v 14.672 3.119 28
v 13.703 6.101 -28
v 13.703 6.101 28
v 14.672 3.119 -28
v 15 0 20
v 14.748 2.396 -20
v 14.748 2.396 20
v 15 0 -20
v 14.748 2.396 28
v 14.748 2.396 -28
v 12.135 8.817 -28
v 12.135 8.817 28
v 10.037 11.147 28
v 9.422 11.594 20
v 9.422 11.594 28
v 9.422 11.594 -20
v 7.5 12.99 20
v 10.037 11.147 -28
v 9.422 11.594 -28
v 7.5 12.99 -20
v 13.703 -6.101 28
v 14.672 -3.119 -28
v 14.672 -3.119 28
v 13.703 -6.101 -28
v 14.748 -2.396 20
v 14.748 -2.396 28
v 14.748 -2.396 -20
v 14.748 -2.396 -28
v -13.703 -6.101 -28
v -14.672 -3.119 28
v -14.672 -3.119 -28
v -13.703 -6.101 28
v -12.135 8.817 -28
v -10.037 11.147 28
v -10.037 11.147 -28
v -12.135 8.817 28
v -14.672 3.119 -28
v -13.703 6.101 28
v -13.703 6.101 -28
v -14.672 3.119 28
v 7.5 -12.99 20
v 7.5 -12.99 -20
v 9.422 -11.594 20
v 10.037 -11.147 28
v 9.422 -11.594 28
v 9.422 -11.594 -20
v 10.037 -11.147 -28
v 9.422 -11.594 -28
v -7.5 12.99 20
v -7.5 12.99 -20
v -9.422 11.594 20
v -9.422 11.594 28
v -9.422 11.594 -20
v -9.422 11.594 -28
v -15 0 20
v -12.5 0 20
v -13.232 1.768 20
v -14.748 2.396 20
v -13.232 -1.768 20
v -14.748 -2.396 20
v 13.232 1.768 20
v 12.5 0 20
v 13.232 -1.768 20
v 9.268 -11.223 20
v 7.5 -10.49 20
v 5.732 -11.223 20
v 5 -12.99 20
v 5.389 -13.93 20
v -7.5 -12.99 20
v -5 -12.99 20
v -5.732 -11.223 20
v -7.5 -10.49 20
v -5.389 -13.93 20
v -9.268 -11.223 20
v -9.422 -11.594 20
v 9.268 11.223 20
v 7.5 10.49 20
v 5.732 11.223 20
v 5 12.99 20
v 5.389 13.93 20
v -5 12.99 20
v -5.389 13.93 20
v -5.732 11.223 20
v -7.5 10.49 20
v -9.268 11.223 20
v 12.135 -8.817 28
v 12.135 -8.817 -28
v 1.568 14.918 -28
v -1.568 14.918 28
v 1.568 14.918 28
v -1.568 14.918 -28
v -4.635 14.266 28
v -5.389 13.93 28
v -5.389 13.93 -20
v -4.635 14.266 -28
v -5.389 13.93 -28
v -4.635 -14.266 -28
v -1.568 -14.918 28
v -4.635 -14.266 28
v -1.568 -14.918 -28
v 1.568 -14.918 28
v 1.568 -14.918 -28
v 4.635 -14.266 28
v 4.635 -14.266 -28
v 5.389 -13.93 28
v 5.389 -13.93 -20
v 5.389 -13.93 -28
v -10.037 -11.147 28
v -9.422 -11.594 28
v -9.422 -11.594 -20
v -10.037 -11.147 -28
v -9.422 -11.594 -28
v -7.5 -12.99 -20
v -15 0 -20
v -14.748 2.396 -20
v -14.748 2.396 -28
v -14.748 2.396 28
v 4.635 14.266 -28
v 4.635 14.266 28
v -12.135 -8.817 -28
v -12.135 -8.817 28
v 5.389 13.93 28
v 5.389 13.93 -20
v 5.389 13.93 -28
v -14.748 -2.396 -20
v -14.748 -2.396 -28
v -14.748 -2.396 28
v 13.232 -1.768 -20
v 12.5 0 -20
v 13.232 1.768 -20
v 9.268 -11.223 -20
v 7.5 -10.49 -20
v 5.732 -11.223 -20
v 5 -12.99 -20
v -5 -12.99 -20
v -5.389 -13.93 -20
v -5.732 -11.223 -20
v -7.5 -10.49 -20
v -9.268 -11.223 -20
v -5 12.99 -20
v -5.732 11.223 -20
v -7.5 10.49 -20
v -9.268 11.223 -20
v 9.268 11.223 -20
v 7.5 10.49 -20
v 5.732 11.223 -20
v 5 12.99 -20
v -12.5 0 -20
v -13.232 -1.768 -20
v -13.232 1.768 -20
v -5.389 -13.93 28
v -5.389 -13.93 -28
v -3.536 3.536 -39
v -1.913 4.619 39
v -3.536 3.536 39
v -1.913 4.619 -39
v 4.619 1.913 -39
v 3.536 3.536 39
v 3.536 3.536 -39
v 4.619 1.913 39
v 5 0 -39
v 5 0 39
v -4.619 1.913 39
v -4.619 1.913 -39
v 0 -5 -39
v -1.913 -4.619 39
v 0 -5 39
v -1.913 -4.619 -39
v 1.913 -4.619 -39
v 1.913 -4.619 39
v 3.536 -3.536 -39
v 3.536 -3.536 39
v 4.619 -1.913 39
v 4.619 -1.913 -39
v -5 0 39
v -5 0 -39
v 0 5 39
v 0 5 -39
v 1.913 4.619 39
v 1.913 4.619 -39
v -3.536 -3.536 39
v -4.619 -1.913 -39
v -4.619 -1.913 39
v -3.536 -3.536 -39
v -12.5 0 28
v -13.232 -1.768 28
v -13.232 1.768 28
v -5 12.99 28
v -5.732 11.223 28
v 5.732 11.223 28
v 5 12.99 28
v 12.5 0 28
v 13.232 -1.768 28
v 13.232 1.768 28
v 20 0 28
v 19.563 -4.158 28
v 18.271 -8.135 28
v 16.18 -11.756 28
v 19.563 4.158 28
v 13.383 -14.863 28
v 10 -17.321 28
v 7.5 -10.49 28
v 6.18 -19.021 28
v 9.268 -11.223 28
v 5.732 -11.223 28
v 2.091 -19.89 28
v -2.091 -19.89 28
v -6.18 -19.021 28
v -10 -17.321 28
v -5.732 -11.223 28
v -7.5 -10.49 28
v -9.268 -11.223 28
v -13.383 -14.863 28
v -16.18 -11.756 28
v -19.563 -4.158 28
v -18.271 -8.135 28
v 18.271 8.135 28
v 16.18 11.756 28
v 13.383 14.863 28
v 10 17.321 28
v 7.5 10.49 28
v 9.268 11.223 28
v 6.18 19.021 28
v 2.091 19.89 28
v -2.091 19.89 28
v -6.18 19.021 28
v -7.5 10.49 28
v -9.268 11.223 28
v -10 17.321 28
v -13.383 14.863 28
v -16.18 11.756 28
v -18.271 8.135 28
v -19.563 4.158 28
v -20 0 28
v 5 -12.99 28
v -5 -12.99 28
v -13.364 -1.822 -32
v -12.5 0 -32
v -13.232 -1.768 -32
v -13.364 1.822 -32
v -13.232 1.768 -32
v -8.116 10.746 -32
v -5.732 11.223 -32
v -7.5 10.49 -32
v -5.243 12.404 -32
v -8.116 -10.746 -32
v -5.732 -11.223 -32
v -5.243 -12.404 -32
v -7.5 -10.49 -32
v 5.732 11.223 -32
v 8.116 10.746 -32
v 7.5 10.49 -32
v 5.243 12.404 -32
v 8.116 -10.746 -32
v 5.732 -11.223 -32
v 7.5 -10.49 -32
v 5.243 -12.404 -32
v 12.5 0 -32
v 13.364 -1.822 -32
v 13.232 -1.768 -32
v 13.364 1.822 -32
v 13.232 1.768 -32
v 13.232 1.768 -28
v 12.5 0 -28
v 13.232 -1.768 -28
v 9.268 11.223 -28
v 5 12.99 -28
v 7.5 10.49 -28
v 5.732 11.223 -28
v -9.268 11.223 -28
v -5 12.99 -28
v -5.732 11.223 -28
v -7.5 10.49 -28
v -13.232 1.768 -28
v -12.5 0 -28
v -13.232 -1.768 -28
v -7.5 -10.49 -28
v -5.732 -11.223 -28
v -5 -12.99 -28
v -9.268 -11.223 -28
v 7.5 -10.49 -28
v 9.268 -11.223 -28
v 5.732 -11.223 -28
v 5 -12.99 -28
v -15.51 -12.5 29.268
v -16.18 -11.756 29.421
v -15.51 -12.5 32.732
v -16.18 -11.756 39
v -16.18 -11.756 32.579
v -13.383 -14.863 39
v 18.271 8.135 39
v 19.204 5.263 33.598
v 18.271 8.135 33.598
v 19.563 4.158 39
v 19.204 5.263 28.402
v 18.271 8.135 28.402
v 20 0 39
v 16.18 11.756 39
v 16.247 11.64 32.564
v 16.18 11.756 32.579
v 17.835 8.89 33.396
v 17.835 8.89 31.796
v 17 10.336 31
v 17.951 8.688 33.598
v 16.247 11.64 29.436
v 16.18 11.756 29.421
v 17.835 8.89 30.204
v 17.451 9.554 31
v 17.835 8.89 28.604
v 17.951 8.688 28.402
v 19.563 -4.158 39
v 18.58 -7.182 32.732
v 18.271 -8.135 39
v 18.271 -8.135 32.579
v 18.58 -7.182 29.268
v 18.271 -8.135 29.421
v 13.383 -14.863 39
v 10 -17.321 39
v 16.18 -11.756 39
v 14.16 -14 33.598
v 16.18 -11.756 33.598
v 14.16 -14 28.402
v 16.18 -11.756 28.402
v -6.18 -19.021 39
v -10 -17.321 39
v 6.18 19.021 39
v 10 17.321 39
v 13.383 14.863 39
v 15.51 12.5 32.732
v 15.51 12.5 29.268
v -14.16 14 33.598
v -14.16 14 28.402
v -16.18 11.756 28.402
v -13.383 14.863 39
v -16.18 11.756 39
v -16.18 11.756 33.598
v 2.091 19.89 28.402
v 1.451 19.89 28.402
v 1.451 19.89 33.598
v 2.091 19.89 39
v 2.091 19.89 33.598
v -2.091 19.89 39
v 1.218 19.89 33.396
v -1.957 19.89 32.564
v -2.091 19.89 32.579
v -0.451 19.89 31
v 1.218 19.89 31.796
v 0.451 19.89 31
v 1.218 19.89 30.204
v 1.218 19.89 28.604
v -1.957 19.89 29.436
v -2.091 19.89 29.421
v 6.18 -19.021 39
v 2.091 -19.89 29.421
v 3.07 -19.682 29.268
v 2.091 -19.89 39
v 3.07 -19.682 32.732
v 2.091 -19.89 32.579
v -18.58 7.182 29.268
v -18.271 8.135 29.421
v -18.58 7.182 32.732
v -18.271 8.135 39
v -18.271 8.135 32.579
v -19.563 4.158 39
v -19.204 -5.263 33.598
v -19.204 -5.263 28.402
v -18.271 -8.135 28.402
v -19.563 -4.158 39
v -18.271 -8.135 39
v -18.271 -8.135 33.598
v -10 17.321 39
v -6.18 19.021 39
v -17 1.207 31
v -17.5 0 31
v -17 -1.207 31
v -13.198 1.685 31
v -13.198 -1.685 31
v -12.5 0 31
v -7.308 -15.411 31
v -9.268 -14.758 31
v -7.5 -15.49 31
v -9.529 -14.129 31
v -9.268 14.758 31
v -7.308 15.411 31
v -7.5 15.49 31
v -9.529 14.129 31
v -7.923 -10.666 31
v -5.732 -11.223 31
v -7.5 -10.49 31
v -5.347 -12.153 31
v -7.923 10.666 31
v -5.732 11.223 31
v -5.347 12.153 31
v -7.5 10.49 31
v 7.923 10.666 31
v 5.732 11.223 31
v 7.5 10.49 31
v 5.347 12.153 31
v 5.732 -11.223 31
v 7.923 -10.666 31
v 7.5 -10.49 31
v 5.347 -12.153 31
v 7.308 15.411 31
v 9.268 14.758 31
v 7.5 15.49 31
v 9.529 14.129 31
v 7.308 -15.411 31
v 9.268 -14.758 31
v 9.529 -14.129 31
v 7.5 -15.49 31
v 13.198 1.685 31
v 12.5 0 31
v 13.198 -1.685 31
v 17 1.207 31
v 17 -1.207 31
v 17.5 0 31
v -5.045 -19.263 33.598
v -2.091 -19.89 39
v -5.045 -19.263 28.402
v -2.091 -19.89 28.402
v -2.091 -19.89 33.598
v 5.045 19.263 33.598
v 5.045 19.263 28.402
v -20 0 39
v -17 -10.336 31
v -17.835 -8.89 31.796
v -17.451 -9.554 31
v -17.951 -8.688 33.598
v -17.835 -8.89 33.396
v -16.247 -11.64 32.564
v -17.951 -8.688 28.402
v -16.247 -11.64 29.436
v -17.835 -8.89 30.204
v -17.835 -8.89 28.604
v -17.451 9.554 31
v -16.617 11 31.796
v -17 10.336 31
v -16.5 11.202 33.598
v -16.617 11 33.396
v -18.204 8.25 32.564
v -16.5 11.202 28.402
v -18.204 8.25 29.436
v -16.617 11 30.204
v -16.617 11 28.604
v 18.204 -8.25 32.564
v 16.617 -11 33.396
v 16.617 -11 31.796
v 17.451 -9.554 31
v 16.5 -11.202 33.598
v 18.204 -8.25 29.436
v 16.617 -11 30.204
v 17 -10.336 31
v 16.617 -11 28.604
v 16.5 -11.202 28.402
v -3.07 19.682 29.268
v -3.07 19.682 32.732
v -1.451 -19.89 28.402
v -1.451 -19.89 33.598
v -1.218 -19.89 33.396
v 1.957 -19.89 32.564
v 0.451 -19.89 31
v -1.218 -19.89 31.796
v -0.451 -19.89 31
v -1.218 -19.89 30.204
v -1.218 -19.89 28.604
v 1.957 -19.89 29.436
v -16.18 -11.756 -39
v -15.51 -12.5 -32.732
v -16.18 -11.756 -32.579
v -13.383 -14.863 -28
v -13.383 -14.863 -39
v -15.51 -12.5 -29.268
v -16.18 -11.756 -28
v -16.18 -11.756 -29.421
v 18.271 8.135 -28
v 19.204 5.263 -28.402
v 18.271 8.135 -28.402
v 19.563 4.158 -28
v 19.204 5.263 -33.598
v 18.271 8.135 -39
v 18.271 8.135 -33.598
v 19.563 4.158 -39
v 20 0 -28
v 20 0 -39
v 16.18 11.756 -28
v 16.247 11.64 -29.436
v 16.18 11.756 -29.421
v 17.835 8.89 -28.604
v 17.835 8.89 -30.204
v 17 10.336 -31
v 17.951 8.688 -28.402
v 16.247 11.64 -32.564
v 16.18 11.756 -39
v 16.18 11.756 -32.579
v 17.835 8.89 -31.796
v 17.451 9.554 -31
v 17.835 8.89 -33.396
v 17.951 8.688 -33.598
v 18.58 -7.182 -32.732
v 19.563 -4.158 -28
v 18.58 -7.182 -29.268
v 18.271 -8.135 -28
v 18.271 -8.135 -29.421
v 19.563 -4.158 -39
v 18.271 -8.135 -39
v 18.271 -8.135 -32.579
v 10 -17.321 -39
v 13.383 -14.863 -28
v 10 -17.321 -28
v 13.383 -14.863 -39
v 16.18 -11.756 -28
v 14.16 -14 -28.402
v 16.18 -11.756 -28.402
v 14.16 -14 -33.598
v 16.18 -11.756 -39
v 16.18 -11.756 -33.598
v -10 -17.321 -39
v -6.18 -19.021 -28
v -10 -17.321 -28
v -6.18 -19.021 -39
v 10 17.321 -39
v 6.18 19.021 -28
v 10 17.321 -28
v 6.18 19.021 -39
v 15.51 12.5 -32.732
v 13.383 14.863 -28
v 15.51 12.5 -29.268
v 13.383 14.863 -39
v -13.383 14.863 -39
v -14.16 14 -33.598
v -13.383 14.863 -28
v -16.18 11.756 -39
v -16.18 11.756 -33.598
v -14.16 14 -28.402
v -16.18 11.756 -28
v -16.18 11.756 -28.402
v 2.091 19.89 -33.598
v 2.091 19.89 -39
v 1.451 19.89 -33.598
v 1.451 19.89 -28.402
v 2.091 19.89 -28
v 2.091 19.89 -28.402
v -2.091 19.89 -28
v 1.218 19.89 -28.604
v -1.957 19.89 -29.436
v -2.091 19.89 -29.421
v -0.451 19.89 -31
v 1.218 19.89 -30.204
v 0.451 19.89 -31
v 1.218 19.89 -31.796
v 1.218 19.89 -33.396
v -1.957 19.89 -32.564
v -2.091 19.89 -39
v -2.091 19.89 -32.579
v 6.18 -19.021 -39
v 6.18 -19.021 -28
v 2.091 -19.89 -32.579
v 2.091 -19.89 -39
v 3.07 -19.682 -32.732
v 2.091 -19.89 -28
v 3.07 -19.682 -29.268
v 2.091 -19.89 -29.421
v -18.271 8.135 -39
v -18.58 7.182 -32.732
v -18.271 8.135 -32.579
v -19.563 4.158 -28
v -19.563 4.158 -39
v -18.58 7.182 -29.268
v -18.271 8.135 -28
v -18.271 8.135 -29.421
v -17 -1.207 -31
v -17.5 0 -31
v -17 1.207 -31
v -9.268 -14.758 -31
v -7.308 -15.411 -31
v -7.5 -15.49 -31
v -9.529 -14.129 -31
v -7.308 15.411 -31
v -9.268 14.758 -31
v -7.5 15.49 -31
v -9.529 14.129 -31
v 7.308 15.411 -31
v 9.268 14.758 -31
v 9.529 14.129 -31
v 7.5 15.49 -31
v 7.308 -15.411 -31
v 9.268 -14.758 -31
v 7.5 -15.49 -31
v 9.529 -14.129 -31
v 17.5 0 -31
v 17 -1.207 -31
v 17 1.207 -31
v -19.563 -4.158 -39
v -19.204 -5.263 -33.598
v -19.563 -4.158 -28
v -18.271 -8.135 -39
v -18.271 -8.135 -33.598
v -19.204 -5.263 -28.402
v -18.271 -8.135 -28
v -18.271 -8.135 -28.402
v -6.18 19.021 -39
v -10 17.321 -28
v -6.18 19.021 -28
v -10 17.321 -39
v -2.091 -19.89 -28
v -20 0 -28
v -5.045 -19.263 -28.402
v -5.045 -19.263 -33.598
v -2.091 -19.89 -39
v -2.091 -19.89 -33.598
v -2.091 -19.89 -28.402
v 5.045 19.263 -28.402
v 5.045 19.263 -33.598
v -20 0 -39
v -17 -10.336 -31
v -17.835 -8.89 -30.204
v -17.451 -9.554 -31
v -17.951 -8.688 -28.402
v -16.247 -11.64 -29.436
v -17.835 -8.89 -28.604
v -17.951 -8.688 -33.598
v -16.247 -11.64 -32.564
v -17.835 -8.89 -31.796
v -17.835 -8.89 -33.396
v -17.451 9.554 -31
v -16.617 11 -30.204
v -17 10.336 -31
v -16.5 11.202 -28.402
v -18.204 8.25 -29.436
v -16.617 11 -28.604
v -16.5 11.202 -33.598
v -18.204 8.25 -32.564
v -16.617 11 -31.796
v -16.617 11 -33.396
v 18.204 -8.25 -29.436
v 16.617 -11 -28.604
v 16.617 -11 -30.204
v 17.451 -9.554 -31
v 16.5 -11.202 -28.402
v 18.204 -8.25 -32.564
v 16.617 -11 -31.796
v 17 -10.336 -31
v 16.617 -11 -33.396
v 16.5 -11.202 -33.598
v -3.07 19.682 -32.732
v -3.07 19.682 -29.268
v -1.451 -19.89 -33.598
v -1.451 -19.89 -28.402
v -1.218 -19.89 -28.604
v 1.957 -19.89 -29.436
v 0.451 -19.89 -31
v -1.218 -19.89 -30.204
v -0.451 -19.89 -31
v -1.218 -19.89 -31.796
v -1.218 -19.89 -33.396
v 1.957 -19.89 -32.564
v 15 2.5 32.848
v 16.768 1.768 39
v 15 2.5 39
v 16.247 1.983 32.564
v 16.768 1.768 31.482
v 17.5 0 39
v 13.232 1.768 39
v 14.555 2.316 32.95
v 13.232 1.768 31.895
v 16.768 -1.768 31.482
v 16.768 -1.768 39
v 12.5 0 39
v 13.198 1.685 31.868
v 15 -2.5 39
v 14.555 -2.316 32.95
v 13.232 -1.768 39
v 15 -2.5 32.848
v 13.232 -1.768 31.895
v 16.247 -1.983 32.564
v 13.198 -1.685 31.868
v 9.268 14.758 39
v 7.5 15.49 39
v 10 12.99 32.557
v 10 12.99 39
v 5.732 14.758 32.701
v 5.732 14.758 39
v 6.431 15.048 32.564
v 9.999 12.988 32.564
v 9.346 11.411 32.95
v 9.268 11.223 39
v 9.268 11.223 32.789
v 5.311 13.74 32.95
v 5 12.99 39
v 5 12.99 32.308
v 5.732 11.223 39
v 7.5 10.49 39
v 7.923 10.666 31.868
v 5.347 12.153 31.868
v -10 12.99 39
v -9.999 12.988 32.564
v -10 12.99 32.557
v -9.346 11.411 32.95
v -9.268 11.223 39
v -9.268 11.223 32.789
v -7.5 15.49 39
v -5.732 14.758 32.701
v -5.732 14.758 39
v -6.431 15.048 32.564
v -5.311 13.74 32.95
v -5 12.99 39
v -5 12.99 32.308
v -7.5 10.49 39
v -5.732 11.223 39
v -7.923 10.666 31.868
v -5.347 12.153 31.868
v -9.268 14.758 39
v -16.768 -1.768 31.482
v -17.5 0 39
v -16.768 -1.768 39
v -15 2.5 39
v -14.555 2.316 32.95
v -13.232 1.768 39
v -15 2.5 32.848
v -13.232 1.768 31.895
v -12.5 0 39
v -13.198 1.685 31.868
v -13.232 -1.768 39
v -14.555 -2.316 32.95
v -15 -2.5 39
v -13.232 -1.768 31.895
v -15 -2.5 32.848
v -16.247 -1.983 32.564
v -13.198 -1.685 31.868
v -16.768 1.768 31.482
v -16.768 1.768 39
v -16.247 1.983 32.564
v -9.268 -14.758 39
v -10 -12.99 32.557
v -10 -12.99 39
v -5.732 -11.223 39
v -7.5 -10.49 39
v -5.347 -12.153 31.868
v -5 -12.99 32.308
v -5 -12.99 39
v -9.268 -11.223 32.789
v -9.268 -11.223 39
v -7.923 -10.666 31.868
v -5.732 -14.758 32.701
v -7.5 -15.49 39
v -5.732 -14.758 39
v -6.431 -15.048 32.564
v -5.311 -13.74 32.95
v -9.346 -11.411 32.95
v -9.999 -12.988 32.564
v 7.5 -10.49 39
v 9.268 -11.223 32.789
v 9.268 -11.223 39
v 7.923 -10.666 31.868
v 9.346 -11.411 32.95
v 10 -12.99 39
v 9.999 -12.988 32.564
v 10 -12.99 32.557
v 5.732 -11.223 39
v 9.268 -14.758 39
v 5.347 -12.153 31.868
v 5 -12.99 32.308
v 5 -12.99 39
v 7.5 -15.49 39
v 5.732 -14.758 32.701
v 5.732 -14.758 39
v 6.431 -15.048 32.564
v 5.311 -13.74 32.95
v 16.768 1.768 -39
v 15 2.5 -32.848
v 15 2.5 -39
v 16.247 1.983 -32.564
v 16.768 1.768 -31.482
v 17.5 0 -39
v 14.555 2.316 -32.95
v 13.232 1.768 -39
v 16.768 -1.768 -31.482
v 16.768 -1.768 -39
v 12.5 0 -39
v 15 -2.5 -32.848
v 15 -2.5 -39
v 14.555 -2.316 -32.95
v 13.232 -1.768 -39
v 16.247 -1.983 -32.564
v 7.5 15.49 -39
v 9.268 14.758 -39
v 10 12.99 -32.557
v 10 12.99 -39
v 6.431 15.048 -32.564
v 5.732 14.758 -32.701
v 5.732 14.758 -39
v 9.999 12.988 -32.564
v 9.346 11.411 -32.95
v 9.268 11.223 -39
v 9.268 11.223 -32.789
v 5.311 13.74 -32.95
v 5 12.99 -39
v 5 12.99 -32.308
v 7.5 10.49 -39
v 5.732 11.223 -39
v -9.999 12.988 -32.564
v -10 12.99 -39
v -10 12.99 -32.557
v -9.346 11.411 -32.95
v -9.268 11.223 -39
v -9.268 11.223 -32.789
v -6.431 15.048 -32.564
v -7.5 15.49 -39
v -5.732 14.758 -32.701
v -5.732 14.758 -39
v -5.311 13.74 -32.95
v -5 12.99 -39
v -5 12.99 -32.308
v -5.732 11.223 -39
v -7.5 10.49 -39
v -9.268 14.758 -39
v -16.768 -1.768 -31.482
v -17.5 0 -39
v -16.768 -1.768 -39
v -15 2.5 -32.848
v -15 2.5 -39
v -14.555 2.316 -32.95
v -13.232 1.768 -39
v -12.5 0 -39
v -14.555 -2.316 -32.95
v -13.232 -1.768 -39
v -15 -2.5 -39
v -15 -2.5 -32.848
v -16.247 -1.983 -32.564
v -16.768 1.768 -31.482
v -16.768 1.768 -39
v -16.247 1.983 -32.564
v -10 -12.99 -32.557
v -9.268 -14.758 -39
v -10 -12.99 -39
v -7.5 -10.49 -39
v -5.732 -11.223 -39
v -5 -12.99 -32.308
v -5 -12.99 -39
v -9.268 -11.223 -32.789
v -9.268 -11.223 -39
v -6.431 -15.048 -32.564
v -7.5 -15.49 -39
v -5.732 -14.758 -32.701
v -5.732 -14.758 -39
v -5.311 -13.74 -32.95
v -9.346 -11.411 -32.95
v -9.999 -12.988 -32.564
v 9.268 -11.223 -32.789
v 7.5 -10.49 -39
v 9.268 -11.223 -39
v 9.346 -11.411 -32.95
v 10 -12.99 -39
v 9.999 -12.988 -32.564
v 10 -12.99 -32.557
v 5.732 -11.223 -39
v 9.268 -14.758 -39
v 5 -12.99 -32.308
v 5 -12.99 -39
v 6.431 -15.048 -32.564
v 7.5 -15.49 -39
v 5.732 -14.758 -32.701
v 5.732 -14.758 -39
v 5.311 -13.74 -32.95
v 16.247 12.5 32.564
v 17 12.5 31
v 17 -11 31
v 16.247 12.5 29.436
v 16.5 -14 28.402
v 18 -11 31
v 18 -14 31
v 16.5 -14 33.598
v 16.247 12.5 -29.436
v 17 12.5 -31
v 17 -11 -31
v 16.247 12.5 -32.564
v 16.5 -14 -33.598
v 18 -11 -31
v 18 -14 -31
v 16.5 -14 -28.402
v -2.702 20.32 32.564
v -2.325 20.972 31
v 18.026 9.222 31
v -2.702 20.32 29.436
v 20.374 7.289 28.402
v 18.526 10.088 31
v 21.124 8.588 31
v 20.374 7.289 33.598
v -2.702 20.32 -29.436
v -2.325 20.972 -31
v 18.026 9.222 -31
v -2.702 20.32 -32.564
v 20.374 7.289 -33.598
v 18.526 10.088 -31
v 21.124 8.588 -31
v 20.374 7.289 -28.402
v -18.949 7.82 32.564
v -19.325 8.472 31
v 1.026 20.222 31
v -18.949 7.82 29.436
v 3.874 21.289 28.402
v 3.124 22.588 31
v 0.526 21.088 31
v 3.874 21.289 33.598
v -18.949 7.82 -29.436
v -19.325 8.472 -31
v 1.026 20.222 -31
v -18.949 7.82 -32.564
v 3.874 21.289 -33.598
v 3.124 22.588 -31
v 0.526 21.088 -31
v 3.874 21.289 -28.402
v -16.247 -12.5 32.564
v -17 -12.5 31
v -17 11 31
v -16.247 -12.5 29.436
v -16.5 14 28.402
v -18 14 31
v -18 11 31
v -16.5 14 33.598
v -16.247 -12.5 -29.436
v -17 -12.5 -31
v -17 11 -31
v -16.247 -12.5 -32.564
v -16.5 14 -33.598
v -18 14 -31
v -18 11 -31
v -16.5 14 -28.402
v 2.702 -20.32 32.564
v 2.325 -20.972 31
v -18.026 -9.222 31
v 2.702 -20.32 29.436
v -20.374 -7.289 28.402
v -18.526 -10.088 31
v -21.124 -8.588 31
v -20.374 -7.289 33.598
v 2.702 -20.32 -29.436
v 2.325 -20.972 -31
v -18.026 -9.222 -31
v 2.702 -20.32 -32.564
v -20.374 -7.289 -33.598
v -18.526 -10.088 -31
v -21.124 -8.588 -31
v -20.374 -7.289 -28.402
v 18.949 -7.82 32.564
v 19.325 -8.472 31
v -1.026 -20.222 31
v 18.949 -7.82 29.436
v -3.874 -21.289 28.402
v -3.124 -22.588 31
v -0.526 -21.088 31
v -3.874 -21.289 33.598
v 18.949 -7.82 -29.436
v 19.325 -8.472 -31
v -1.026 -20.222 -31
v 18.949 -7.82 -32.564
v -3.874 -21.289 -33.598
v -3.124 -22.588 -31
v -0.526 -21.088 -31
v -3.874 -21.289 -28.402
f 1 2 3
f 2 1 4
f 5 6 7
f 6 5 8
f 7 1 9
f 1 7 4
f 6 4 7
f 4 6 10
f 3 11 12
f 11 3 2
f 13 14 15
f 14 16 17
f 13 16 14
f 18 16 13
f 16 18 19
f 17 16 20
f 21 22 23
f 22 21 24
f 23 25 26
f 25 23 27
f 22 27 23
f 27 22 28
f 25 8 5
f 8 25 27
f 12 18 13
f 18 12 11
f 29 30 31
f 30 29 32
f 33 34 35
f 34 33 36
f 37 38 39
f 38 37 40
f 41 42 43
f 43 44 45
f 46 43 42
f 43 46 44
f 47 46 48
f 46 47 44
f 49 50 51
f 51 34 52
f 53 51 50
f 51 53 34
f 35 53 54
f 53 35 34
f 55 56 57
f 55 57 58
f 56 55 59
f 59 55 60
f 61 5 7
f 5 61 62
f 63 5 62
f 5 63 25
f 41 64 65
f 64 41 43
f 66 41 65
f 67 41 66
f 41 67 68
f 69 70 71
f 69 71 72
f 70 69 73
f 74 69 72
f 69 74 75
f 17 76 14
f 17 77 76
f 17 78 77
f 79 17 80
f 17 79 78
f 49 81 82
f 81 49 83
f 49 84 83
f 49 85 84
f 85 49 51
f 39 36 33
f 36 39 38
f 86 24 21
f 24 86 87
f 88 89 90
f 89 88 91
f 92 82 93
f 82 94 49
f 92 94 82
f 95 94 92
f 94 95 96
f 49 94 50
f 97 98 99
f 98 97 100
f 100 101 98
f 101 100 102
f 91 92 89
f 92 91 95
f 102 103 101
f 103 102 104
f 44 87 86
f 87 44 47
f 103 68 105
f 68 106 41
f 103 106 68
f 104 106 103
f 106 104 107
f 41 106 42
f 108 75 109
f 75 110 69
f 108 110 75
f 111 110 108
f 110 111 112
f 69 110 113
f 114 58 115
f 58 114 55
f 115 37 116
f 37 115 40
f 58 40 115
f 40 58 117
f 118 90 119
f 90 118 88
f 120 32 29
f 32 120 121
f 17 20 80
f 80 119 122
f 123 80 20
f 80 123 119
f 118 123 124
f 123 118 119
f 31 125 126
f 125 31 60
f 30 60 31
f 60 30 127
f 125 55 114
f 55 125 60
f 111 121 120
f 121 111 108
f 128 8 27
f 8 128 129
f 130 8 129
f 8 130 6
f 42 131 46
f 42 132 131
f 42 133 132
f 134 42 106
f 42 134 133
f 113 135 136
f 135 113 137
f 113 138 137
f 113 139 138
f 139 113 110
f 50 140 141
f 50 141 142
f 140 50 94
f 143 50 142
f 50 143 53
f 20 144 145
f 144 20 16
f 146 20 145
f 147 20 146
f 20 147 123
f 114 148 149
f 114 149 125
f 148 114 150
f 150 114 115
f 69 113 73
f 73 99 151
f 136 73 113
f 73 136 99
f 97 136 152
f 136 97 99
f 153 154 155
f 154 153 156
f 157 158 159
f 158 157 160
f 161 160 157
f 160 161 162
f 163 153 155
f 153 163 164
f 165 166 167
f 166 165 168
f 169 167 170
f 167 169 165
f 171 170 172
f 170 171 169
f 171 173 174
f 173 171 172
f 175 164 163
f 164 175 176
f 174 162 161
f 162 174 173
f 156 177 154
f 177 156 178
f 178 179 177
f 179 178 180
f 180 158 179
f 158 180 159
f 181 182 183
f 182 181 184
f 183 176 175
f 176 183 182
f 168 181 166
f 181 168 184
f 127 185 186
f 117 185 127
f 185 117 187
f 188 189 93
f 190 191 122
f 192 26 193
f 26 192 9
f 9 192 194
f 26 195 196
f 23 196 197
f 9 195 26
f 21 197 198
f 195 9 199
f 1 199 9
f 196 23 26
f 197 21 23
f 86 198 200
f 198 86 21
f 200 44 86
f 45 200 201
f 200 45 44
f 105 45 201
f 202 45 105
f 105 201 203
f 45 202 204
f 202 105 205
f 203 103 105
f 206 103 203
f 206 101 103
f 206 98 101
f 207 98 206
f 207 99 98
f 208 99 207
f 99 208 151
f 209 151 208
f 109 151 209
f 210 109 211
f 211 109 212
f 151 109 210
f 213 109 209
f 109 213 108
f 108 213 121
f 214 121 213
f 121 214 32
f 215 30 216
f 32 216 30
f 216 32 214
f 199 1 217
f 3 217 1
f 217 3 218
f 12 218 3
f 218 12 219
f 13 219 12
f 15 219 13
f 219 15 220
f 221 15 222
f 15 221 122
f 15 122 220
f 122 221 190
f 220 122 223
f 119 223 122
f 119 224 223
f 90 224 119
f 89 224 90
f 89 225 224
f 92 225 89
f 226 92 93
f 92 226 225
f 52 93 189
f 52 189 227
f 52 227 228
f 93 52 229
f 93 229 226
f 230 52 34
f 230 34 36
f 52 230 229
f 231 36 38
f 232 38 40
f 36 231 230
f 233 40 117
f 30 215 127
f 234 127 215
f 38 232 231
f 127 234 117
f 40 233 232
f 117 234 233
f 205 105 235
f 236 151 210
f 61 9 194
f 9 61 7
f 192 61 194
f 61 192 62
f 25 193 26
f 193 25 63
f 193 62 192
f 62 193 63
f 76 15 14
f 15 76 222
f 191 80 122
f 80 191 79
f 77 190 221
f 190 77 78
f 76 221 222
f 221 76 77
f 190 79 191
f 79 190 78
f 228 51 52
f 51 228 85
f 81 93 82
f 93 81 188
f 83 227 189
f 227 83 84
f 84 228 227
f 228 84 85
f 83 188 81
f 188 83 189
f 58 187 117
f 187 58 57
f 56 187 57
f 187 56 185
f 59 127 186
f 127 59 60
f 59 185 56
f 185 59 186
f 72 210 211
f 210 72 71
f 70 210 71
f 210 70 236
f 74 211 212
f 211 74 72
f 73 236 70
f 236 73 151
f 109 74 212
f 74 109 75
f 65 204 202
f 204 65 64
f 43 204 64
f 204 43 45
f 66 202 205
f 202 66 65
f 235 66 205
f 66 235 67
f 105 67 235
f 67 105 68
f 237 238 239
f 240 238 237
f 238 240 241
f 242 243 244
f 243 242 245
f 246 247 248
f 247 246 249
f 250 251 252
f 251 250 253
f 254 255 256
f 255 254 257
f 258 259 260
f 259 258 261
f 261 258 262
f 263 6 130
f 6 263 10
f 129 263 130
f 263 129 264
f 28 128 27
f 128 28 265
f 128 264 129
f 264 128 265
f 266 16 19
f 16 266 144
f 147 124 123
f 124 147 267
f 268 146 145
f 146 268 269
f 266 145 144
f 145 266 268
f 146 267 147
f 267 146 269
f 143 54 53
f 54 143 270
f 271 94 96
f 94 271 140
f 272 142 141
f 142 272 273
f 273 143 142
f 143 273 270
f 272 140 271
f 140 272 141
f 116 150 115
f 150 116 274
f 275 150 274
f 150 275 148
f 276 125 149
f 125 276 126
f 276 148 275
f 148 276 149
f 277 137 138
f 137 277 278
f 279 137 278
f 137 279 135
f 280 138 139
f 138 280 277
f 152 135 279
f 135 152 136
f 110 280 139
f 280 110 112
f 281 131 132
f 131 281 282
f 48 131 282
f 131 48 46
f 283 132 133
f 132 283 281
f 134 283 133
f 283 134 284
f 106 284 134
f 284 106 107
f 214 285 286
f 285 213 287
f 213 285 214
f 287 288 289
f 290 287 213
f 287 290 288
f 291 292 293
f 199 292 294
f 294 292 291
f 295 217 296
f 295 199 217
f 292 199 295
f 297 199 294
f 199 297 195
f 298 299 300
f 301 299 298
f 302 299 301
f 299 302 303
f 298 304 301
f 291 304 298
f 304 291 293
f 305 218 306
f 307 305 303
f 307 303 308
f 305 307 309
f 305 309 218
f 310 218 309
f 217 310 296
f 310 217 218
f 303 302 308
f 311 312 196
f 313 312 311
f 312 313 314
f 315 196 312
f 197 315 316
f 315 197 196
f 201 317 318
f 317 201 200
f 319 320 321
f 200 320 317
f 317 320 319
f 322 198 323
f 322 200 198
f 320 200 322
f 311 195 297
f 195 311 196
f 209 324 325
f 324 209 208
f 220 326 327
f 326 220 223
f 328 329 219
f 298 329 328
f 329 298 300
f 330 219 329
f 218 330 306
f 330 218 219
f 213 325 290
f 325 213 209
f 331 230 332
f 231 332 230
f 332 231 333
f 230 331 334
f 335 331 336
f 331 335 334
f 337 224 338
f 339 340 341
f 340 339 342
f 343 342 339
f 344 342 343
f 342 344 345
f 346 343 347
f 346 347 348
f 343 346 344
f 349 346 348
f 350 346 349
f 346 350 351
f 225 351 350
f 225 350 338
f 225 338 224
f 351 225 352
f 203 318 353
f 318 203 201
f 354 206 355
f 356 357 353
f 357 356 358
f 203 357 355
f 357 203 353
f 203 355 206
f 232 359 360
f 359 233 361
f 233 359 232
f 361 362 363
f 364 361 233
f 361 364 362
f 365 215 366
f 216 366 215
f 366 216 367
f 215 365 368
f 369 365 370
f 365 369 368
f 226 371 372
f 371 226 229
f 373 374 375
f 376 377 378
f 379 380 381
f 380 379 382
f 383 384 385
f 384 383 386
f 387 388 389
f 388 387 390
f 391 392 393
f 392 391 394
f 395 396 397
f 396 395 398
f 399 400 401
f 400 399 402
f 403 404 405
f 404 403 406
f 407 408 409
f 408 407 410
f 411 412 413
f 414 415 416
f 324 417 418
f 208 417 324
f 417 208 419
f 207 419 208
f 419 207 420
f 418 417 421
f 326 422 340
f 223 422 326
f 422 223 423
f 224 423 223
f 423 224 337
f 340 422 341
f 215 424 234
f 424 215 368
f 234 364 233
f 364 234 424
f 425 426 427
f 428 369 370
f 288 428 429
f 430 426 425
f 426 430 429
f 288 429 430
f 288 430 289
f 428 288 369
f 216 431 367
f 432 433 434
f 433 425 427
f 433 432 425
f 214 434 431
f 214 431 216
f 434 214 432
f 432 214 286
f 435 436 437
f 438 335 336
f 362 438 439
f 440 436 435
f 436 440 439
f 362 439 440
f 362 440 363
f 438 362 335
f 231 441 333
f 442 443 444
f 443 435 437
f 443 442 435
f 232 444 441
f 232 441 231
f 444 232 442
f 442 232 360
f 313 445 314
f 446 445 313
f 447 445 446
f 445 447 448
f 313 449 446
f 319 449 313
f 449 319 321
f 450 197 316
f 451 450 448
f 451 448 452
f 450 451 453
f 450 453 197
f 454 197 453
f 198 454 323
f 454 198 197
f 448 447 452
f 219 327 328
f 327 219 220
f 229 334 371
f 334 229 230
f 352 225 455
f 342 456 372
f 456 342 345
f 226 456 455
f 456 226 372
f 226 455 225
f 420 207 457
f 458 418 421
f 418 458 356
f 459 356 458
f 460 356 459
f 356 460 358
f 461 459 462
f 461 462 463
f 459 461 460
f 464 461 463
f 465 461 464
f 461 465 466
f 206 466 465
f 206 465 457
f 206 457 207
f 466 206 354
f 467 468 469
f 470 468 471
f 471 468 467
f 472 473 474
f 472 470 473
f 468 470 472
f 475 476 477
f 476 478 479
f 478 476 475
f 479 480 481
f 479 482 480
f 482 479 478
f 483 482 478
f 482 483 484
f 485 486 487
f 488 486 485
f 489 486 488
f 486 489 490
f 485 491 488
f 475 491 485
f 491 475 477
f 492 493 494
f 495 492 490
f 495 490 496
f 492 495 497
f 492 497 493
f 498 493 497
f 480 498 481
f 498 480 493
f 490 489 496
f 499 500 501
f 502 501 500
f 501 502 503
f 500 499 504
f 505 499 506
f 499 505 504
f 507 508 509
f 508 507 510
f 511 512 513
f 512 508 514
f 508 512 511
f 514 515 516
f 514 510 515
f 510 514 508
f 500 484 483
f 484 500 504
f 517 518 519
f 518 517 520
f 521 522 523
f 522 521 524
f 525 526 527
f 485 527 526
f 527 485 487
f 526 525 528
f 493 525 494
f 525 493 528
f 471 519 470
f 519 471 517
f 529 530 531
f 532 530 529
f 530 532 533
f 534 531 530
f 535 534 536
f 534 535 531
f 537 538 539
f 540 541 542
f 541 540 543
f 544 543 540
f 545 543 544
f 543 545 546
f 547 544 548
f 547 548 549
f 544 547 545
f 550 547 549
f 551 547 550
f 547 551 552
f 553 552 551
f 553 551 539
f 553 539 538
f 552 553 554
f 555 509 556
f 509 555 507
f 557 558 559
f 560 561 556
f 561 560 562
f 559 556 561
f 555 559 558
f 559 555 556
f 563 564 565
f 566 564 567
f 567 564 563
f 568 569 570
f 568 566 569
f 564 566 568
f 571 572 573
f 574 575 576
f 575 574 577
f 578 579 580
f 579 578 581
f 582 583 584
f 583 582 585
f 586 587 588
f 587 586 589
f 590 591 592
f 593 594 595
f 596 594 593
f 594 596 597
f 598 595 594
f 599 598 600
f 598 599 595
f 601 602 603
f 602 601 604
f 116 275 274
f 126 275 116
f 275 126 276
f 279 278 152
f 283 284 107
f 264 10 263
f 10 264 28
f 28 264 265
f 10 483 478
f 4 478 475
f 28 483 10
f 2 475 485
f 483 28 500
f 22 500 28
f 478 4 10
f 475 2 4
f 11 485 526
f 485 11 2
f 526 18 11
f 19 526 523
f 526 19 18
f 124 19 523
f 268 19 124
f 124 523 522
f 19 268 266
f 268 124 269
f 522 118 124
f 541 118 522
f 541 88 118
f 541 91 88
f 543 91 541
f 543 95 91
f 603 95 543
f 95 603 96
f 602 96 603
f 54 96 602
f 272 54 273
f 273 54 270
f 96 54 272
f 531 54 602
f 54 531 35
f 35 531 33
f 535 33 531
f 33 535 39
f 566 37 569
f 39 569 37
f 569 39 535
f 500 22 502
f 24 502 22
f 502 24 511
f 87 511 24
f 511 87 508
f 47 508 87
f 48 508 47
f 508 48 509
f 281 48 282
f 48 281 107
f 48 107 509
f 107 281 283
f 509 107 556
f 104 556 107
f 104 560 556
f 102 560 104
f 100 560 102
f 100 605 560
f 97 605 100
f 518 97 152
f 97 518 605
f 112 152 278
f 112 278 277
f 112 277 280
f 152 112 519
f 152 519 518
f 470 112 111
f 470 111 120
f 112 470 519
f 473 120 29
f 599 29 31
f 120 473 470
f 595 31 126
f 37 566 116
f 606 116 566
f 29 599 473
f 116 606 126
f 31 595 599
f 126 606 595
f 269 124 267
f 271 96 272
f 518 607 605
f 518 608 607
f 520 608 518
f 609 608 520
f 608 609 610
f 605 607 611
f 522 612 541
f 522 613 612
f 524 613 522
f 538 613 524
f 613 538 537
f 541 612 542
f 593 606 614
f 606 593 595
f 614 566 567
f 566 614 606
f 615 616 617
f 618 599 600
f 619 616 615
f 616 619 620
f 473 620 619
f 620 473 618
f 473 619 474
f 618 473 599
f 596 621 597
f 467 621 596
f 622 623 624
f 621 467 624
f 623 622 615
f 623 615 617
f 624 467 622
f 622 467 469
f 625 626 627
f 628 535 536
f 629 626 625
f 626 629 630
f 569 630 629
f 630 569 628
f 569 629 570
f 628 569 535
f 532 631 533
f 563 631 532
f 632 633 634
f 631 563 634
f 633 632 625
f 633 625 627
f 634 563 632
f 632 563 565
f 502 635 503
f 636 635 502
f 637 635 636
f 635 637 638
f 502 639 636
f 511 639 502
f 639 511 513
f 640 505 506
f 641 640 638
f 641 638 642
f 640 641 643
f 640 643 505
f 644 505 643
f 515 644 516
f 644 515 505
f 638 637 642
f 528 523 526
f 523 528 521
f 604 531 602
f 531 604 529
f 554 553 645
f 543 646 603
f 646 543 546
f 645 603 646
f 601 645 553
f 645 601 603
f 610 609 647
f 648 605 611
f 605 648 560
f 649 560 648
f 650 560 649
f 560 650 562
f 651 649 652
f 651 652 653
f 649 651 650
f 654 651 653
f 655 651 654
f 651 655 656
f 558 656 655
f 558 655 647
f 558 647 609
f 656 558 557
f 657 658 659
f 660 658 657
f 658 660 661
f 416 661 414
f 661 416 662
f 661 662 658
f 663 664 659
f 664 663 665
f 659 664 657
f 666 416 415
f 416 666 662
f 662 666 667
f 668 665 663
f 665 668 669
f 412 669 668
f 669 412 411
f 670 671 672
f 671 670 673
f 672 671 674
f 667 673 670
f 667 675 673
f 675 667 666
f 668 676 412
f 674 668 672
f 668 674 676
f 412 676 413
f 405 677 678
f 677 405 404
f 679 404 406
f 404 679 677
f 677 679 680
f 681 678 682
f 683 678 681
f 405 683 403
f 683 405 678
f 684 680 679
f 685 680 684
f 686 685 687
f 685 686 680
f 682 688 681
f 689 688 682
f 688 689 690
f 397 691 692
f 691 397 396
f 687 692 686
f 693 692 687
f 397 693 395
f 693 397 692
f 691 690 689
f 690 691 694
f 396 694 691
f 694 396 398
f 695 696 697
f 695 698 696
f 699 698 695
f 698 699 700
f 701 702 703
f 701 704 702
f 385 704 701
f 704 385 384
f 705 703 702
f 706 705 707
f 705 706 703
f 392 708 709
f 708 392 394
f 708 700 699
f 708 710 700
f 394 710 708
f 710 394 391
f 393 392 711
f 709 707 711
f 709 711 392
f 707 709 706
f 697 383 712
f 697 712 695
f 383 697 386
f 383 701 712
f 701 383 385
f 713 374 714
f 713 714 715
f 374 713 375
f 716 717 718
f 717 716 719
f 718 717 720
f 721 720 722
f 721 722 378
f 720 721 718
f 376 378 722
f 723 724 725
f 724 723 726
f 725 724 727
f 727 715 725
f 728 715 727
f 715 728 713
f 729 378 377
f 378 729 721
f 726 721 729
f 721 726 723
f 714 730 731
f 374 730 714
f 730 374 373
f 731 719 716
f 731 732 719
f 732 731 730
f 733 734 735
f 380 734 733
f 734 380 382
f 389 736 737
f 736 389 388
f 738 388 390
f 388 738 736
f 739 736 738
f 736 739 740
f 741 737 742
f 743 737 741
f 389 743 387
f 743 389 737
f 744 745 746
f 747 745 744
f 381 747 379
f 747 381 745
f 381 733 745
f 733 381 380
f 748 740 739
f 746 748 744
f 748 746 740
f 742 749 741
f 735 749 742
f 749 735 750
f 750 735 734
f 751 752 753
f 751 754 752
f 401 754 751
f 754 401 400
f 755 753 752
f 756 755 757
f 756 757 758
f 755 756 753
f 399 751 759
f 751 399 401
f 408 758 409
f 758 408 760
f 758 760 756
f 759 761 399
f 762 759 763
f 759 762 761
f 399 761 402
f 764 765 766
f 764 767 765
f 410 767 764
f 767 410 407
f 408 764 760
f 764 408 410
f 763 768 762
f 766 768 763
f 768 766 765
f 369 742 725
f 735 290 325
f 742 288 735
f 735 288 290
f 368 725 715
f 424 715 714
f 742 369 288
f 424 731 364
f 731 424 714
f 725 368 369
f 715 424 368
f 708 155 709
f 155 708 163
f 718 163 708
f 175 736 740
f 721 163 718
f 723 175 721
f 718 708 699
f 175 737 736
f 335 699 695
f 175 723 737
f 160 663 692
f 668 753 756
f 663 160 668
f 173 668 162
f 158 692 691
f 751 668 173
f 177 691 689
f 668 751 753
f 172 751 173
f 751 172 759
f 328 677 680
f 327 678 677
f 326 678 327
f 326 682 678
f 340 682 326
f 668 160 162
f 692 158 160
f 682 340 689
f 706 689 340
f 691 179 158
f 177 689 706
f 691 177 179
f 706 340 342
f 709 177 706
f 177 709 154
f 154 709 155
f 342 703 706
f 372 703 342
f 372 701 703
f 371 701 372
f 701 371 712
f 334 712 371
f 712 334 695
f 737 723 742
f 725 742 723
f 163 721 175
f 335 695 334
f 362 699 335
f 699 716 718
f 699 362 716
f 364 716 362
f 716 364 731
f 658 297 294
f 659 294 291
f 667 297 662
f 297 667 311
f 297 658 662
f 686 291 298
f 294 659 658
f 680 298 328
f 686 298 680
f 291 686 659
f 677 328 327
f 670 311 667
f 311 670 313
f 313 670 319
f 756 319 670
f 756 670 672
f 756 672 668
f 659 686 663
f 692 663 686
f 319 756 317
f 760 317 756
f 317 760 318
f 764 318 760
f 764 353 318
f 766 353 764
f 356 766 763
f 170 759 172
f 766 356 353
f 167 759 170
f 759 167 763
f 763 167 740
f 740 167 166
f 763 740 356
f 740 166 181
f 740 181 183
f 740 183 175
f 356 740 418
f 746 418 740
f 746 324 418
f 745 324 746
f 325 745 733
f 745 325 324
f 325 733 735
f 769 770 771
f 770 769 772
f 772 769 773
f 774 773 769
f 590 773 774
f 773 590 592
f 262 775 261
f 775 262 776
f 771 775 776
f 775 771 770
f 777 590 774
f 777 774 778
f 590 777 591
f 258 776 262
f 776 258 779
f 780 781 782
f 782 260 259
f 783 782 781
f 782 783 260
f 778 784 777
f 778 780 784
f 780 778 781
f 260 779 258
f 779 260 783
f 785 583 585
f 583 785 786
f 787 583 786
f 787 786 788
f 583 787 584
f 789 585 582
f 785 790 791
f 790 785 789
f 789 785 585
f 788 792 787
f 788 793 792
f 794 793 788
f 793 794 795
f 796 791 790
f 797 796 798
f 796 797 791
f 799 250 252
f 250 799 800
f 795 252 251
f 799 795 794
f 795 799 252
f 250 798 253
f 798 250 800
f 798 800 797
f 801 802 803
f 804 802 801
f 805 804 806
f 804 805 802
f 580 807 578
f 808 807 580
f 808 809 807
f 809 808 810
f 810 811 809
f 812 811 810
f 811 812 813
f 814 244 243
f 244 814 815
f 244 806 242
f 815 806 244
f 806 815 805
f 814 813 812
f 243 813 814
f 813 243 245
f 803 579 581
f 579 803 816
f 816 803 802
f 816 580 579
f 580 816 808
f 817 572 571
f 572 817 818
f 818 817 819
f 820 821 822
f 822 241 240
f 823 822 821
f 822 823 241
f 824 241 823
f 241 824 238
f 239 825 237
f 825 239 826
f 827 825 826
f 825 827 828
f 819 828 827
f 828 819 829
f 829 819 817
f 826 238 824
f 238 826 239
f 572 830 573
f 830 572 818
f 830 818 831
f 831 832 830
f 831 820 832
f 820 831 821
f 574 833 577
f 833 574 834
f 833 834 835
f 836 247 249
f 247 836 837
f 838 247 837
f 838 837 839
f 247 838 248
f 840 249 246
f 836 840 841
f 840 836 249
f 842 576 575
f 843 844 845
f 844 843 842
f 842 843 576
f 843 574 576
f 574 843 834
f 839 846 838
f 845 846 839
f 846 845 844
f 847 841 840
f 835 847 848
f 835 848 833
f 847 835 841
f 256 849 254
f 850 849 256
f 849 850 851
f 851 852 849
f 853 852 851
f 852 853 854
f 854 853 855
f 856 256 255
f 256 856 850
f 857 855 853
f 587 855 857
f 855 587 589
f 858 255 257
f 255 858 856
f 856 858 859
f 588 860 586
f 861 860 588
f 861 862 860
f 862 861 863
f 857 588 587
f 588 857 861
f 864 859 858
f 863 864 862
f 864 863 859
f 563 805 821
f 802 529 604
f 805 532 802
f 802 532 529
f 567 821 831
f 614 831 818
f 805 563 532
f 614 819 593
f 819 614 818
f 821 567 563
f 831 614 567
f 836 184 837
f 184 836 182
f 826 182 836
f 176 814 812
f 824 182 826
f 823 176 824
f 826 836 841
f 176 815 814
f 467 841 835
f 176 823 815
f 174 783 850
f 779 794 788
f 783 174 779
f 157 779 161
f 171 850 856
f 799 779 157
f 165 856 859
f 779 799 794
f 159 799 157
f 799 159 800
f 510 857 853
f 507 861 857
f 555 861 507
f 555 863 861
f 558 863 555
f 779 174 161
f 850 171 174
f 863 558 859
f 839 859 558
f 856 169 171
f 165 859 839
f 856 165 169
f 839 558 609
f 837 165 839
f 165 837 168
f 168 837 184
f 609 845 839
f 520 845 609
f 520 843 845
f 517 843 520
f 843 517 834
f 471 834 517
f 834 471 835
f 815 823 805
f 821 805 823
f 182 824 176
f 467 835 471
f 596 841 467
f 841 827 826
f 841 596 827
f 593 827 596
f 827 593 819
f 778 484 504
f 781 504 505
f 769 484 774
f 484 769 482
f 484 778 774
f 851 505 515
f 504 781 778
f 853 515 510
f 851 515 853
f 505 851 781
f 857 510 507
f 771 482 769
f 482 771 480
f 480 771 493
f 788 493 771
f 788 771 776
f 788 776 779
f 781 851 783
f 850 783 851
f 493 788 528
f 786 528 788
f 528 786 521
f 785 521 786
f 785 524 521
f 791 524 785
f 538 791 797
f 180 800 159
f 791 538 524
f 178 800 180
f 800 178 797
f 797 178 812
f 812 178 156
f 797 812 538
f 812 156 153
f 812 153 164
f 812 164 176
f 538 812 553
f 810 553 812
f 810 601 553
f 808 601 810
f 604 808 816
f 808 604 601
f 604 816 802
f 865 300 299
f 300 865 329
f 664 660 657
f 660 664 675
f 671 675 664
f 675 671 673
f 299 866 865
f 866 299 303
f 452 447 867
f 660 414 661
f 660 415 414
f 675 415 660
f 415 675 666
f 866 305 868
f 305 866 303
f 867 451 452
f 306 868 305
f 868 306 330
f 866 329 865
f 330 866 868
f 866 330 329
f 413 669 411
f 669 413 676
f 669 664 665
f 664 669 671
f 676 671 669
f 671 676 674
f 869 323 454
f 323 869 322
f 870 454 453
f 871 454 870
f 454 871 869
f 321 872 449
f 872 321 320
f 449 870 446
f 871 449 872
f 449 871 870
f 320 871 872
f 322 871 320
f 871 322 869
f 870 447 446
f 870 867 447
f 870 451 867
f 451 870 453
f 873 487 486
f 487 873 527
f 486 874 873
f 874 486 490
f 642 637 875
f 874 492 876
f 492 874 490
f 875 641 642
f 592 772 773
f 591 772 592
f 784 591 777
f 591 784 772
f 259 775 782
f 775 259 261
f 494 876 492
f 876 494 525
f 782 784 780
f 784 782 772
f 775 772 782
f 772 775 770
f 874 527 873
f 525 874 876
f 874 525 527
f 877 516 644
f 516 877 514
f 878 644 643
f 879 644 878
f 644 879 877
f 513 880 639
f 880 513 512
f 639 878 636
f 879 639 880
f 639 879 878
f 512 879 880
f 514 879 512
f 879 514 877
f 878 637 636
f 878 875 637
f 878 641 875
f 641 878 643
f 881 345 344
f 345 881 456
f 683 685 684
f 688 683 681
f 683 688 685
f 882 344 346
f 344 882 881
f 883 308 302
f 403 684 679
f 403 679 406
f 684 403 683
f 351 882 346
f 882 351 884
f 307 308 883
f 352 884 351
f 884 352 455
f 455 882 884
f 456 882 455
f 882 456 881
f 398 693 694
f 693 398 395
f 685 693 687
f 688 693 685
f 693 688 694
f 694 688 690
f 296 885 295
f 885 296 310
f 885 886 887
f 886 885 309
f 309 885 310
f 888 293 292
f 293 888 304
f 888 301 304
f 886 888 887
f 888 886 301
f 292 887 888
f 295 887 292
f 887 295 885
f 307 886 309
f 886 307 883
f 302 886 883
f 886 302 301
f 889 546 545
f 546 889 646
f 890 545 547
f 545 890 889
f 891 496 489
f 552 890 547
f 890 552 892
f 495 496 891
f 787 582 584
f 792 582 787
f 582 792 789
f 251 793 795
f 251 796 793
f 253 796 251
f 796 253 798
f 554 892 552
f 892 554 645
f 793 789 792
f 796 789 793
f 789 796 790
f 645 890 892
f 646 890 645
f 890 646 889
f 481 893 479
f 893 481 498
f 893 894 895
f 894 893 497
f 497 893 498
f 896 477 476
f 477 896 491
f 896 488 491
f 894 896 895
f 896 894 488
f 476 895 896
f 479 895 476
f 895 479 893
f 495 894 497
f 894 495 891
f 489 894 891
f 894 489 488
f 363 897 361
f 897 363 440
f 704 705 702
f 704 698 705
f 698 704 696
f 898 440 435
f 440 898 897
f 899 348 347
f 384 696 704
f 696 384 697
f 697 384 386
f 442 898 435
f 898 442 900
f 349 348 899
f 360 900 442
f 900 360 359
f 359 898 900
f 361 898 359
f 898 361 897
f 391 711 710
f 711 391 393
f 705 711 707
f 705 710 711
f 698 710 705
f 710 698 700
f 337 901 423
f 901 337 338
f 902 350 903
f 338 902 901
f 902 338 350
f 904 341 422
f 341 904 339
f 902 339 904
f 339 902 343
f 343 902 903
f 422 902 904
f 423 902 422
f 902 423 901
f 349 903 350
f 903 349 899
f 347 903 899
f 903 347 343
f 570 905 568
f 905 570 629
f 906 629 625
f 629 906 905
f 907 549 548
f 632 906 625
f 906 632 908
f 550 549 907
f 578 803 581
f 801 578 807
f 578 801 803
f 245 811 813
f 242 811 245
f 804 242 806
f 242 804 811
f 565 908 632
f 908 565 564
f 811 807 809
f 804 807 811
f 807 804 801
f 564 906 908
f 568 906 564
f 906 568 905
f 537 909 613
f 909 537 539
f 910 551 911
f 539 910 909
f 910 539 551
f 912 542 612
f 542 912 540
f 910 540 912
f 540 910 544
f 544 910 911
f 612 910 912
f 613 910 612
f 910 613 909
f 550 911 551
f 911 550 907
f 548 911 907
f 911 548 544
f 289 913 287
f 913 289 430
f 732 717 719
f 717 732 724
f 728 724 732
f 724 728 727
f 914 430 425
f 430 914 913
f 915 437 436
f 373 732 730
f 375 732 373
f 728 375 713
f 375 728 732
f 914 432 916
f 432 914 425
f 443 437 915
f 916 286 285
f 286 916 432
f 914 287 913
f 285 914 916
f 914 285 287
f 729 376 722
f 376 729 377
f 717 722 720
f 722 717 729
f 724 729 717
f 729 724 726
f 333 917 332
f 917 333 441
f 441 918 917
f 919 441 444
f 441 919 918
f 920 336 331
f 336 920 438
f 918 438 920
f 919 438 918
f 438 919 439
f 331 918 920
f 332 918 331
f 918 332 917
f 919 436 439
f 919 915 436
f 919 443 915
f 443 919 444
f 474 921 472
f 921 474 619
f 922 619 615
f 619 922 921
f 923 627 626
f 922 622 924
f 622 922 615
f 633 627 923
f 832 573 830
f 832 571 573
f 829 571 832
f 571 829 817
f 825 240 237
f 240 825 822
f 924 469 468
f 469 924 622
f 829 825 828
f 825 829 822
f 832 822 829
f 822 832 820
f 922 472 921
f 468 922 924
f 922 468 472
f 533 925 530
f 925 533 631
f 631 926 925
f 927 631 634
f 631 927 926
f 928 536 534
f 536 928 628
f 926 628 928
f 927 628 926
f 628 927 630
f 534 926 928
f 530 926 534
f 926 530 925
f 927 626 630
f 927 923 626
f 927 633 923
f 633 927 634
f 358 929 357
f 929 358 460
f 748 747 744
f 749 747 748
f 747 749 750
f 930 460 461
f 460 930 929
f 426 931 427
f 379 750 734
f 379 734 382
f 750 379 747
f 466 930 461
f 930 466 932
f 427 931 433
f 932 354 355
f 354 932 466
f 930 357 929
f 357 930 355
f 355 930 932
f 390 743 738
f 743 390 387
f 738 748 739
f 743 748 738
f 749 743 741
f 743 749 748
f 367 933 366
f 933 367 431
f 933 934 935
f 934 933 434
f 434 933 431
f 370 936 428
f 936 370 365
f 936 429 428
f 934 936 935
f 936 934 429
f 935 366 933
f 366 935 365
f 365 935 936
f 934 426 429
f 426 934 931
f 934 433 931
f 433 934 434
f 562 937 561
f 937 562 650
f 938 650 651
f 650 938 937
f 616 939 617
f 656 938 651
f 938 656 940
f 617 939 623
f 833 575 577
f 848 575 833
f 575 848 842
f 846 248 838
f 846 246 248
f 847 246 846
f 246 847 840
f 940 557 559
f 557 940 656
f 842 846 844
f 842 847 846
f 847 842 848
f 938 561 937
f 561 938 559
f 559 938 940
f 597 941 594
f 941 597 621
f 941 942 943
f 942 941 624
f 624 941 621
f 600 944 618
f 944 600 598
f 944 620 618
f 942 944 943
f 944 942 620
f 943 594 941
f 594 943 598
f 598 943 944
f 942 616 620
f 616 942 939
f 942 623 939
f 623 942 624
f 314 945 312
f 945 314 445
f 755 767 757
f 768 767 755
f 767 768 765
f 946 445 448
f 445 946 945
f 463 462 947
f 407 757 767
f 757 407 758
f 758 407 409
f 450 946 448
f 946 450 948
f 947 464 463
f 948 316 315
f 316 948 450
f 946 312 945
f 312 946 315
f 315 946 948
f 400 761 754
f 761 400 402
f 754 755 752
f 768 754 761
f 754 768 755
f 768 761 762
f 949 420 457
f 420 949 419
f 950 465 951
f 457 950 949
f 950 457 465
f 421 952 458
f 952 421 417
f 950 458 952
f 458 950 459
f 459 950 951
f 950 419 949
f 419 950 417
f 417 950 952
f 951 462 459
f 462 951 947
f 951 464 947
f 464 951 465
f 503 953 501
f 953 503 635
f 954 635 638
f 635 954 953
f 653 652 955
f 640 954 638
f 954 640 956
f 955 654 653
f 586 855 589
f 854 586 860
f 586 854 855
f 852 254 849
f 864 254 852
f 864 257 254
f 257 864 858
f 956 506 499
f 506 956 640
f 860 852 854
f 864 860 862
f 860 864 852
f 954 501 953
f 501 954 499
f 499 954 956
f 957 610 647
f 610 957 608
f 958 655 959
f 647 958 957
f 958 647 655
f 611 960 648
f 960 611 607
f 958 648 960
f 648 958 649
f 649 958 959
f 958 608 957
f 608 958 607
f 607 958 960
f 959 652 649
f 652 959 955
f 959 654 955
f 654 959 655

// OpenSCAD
// Parameters
shaft_diameter = 10;
central_craft_diameter = 30;
central_craft_length = 40; // Shortened to match the original model
flange_diameter = 40;
flange_thickness = 8; // Increased thickness for accuracy
spacer_thickness = 3; // Adjusted for better definition
bolt_hole_diameter = 5;
bolt_diameter = 4;
bolt_length = 25; // Increased length for better visibility
num_bolts = 6;
bolt_circle_radius = 15;
nut_diameter = 6;
nut_thickness = 3;

// Function to create a flange plate with correct bolt holes
module flange_plate() {
    difference() {
        cylinder(d=flange_diameter, h=flange_thickness, center=true);
        cylinder(d=shaft_diameter, h=flange_thickness + 1, center=true);
        for (i = [0:num_bolts-1]) {
            angle = i * 360 / num_bolts;
            translate([bolt_circle_radius * cos(angle), bolt_circle_radius * sin(angle), 0])
                cylinder(d=bolt_hole_diameter, h=flange_thickness + 1, center=true);
        }
    }
}

// Function to create a spacer ring
module spacer_ring() {
    difference() {
        cylinder(d=flange_diameter, h=spacer_thickness, center=true);
        cylinder(d=shaft_diameter, h=spacer_thickness + 1, center=true);
    }
}

// Function to create a bolt with a nut
module bolt_with_nut() {
    union() {
        cylinder(d=bolt_diameter, h=bolt_length, center=true);
        translate([0, 0, bolt_length / 2])
            cylinder(d=nut_diameter, h=nut_thickness, center=true, $fn=6);
    }
}

// Function to create the central craft with mounting points
module central_craft() {
    difference() {
        cylinder(d=central_craft_diameter, h=central_craft_length, center=true);
        cylinder(d=shaft_diameter, h=central_craft_length + 1, center=true);
    }
}

// Function to create the input and output crafts with correct bolt holes
module input_output_craft() {
    difference() {
        union() {
            cylinder(d=central_craft_diameter, h=flange_thickness, center=true);
            translate([0, 0, -flange_thickness / 2])
                cylinder(d=central_craft_diameter, h=flange_thickness, center=true);
        }
        cylinder(d=shaft_diameter, h=flange_thickness * 2 + 1, center=true);
        for (i = [0:num_bolts-1]) {
            angle = i * 360 / num_bolts;
            translate([bolt_circle_radius * cos(angle), bolt_circle_radius * sin(angle), 0])
                cylinder(d=bolt_hole_diameter, h=flange_thickness + 1, center=true);
        }
    }
}

// Assembly
module flexible_coupling() {
    central_craft();
    
    translate([0, 0, central_craft_length / 2 + flange_thickness / 2])
        input_output_craft();
    
    translate([0, 0, -central_craft_length / 2 - flange_thickness / 2])
        input_output_craft();
    
    translate([0, 0, central_craft_length / 2 + flange_thickness + spacer_thickness / 2])
        spacer_ring();
    
    translate([0, 0, -central_craft_length / 2 - flange_thickness - spacer_thickness / 2])
        spacer_ring();
    
    translate([0, 0, central_craft_length / 2 + flange_thickness + spacer_thickness + flange_thickness / 2])
        flange_plate();
    
    translate([0, 0, -central_craft_length / 2 - flange_thickness - spacer_thickness - flange_thickness / 2])
        flange_plate();
    
    for (i = [0:num_bolts-1]) {
        angle = i * 360 / num_bolts;
        translate([bolt_circle_radius * cos(angle), bolt_circle_radius * sin(angle), central_craft_length / 2 + flange_thickness + spacer_thickness])
            rotate([90, 0, angle])
                bolt_with_nut();
        
        translate([bolt_circle_radius * cos(angle), bolt_circle_radius * sin(angle), -central_craft_length / 2 - flange_thickness - spacer_thickness])
            rotate([90, 0, angle])
                bolt_with_nut();
    }
}

// Render the model
flexible_coupling();
